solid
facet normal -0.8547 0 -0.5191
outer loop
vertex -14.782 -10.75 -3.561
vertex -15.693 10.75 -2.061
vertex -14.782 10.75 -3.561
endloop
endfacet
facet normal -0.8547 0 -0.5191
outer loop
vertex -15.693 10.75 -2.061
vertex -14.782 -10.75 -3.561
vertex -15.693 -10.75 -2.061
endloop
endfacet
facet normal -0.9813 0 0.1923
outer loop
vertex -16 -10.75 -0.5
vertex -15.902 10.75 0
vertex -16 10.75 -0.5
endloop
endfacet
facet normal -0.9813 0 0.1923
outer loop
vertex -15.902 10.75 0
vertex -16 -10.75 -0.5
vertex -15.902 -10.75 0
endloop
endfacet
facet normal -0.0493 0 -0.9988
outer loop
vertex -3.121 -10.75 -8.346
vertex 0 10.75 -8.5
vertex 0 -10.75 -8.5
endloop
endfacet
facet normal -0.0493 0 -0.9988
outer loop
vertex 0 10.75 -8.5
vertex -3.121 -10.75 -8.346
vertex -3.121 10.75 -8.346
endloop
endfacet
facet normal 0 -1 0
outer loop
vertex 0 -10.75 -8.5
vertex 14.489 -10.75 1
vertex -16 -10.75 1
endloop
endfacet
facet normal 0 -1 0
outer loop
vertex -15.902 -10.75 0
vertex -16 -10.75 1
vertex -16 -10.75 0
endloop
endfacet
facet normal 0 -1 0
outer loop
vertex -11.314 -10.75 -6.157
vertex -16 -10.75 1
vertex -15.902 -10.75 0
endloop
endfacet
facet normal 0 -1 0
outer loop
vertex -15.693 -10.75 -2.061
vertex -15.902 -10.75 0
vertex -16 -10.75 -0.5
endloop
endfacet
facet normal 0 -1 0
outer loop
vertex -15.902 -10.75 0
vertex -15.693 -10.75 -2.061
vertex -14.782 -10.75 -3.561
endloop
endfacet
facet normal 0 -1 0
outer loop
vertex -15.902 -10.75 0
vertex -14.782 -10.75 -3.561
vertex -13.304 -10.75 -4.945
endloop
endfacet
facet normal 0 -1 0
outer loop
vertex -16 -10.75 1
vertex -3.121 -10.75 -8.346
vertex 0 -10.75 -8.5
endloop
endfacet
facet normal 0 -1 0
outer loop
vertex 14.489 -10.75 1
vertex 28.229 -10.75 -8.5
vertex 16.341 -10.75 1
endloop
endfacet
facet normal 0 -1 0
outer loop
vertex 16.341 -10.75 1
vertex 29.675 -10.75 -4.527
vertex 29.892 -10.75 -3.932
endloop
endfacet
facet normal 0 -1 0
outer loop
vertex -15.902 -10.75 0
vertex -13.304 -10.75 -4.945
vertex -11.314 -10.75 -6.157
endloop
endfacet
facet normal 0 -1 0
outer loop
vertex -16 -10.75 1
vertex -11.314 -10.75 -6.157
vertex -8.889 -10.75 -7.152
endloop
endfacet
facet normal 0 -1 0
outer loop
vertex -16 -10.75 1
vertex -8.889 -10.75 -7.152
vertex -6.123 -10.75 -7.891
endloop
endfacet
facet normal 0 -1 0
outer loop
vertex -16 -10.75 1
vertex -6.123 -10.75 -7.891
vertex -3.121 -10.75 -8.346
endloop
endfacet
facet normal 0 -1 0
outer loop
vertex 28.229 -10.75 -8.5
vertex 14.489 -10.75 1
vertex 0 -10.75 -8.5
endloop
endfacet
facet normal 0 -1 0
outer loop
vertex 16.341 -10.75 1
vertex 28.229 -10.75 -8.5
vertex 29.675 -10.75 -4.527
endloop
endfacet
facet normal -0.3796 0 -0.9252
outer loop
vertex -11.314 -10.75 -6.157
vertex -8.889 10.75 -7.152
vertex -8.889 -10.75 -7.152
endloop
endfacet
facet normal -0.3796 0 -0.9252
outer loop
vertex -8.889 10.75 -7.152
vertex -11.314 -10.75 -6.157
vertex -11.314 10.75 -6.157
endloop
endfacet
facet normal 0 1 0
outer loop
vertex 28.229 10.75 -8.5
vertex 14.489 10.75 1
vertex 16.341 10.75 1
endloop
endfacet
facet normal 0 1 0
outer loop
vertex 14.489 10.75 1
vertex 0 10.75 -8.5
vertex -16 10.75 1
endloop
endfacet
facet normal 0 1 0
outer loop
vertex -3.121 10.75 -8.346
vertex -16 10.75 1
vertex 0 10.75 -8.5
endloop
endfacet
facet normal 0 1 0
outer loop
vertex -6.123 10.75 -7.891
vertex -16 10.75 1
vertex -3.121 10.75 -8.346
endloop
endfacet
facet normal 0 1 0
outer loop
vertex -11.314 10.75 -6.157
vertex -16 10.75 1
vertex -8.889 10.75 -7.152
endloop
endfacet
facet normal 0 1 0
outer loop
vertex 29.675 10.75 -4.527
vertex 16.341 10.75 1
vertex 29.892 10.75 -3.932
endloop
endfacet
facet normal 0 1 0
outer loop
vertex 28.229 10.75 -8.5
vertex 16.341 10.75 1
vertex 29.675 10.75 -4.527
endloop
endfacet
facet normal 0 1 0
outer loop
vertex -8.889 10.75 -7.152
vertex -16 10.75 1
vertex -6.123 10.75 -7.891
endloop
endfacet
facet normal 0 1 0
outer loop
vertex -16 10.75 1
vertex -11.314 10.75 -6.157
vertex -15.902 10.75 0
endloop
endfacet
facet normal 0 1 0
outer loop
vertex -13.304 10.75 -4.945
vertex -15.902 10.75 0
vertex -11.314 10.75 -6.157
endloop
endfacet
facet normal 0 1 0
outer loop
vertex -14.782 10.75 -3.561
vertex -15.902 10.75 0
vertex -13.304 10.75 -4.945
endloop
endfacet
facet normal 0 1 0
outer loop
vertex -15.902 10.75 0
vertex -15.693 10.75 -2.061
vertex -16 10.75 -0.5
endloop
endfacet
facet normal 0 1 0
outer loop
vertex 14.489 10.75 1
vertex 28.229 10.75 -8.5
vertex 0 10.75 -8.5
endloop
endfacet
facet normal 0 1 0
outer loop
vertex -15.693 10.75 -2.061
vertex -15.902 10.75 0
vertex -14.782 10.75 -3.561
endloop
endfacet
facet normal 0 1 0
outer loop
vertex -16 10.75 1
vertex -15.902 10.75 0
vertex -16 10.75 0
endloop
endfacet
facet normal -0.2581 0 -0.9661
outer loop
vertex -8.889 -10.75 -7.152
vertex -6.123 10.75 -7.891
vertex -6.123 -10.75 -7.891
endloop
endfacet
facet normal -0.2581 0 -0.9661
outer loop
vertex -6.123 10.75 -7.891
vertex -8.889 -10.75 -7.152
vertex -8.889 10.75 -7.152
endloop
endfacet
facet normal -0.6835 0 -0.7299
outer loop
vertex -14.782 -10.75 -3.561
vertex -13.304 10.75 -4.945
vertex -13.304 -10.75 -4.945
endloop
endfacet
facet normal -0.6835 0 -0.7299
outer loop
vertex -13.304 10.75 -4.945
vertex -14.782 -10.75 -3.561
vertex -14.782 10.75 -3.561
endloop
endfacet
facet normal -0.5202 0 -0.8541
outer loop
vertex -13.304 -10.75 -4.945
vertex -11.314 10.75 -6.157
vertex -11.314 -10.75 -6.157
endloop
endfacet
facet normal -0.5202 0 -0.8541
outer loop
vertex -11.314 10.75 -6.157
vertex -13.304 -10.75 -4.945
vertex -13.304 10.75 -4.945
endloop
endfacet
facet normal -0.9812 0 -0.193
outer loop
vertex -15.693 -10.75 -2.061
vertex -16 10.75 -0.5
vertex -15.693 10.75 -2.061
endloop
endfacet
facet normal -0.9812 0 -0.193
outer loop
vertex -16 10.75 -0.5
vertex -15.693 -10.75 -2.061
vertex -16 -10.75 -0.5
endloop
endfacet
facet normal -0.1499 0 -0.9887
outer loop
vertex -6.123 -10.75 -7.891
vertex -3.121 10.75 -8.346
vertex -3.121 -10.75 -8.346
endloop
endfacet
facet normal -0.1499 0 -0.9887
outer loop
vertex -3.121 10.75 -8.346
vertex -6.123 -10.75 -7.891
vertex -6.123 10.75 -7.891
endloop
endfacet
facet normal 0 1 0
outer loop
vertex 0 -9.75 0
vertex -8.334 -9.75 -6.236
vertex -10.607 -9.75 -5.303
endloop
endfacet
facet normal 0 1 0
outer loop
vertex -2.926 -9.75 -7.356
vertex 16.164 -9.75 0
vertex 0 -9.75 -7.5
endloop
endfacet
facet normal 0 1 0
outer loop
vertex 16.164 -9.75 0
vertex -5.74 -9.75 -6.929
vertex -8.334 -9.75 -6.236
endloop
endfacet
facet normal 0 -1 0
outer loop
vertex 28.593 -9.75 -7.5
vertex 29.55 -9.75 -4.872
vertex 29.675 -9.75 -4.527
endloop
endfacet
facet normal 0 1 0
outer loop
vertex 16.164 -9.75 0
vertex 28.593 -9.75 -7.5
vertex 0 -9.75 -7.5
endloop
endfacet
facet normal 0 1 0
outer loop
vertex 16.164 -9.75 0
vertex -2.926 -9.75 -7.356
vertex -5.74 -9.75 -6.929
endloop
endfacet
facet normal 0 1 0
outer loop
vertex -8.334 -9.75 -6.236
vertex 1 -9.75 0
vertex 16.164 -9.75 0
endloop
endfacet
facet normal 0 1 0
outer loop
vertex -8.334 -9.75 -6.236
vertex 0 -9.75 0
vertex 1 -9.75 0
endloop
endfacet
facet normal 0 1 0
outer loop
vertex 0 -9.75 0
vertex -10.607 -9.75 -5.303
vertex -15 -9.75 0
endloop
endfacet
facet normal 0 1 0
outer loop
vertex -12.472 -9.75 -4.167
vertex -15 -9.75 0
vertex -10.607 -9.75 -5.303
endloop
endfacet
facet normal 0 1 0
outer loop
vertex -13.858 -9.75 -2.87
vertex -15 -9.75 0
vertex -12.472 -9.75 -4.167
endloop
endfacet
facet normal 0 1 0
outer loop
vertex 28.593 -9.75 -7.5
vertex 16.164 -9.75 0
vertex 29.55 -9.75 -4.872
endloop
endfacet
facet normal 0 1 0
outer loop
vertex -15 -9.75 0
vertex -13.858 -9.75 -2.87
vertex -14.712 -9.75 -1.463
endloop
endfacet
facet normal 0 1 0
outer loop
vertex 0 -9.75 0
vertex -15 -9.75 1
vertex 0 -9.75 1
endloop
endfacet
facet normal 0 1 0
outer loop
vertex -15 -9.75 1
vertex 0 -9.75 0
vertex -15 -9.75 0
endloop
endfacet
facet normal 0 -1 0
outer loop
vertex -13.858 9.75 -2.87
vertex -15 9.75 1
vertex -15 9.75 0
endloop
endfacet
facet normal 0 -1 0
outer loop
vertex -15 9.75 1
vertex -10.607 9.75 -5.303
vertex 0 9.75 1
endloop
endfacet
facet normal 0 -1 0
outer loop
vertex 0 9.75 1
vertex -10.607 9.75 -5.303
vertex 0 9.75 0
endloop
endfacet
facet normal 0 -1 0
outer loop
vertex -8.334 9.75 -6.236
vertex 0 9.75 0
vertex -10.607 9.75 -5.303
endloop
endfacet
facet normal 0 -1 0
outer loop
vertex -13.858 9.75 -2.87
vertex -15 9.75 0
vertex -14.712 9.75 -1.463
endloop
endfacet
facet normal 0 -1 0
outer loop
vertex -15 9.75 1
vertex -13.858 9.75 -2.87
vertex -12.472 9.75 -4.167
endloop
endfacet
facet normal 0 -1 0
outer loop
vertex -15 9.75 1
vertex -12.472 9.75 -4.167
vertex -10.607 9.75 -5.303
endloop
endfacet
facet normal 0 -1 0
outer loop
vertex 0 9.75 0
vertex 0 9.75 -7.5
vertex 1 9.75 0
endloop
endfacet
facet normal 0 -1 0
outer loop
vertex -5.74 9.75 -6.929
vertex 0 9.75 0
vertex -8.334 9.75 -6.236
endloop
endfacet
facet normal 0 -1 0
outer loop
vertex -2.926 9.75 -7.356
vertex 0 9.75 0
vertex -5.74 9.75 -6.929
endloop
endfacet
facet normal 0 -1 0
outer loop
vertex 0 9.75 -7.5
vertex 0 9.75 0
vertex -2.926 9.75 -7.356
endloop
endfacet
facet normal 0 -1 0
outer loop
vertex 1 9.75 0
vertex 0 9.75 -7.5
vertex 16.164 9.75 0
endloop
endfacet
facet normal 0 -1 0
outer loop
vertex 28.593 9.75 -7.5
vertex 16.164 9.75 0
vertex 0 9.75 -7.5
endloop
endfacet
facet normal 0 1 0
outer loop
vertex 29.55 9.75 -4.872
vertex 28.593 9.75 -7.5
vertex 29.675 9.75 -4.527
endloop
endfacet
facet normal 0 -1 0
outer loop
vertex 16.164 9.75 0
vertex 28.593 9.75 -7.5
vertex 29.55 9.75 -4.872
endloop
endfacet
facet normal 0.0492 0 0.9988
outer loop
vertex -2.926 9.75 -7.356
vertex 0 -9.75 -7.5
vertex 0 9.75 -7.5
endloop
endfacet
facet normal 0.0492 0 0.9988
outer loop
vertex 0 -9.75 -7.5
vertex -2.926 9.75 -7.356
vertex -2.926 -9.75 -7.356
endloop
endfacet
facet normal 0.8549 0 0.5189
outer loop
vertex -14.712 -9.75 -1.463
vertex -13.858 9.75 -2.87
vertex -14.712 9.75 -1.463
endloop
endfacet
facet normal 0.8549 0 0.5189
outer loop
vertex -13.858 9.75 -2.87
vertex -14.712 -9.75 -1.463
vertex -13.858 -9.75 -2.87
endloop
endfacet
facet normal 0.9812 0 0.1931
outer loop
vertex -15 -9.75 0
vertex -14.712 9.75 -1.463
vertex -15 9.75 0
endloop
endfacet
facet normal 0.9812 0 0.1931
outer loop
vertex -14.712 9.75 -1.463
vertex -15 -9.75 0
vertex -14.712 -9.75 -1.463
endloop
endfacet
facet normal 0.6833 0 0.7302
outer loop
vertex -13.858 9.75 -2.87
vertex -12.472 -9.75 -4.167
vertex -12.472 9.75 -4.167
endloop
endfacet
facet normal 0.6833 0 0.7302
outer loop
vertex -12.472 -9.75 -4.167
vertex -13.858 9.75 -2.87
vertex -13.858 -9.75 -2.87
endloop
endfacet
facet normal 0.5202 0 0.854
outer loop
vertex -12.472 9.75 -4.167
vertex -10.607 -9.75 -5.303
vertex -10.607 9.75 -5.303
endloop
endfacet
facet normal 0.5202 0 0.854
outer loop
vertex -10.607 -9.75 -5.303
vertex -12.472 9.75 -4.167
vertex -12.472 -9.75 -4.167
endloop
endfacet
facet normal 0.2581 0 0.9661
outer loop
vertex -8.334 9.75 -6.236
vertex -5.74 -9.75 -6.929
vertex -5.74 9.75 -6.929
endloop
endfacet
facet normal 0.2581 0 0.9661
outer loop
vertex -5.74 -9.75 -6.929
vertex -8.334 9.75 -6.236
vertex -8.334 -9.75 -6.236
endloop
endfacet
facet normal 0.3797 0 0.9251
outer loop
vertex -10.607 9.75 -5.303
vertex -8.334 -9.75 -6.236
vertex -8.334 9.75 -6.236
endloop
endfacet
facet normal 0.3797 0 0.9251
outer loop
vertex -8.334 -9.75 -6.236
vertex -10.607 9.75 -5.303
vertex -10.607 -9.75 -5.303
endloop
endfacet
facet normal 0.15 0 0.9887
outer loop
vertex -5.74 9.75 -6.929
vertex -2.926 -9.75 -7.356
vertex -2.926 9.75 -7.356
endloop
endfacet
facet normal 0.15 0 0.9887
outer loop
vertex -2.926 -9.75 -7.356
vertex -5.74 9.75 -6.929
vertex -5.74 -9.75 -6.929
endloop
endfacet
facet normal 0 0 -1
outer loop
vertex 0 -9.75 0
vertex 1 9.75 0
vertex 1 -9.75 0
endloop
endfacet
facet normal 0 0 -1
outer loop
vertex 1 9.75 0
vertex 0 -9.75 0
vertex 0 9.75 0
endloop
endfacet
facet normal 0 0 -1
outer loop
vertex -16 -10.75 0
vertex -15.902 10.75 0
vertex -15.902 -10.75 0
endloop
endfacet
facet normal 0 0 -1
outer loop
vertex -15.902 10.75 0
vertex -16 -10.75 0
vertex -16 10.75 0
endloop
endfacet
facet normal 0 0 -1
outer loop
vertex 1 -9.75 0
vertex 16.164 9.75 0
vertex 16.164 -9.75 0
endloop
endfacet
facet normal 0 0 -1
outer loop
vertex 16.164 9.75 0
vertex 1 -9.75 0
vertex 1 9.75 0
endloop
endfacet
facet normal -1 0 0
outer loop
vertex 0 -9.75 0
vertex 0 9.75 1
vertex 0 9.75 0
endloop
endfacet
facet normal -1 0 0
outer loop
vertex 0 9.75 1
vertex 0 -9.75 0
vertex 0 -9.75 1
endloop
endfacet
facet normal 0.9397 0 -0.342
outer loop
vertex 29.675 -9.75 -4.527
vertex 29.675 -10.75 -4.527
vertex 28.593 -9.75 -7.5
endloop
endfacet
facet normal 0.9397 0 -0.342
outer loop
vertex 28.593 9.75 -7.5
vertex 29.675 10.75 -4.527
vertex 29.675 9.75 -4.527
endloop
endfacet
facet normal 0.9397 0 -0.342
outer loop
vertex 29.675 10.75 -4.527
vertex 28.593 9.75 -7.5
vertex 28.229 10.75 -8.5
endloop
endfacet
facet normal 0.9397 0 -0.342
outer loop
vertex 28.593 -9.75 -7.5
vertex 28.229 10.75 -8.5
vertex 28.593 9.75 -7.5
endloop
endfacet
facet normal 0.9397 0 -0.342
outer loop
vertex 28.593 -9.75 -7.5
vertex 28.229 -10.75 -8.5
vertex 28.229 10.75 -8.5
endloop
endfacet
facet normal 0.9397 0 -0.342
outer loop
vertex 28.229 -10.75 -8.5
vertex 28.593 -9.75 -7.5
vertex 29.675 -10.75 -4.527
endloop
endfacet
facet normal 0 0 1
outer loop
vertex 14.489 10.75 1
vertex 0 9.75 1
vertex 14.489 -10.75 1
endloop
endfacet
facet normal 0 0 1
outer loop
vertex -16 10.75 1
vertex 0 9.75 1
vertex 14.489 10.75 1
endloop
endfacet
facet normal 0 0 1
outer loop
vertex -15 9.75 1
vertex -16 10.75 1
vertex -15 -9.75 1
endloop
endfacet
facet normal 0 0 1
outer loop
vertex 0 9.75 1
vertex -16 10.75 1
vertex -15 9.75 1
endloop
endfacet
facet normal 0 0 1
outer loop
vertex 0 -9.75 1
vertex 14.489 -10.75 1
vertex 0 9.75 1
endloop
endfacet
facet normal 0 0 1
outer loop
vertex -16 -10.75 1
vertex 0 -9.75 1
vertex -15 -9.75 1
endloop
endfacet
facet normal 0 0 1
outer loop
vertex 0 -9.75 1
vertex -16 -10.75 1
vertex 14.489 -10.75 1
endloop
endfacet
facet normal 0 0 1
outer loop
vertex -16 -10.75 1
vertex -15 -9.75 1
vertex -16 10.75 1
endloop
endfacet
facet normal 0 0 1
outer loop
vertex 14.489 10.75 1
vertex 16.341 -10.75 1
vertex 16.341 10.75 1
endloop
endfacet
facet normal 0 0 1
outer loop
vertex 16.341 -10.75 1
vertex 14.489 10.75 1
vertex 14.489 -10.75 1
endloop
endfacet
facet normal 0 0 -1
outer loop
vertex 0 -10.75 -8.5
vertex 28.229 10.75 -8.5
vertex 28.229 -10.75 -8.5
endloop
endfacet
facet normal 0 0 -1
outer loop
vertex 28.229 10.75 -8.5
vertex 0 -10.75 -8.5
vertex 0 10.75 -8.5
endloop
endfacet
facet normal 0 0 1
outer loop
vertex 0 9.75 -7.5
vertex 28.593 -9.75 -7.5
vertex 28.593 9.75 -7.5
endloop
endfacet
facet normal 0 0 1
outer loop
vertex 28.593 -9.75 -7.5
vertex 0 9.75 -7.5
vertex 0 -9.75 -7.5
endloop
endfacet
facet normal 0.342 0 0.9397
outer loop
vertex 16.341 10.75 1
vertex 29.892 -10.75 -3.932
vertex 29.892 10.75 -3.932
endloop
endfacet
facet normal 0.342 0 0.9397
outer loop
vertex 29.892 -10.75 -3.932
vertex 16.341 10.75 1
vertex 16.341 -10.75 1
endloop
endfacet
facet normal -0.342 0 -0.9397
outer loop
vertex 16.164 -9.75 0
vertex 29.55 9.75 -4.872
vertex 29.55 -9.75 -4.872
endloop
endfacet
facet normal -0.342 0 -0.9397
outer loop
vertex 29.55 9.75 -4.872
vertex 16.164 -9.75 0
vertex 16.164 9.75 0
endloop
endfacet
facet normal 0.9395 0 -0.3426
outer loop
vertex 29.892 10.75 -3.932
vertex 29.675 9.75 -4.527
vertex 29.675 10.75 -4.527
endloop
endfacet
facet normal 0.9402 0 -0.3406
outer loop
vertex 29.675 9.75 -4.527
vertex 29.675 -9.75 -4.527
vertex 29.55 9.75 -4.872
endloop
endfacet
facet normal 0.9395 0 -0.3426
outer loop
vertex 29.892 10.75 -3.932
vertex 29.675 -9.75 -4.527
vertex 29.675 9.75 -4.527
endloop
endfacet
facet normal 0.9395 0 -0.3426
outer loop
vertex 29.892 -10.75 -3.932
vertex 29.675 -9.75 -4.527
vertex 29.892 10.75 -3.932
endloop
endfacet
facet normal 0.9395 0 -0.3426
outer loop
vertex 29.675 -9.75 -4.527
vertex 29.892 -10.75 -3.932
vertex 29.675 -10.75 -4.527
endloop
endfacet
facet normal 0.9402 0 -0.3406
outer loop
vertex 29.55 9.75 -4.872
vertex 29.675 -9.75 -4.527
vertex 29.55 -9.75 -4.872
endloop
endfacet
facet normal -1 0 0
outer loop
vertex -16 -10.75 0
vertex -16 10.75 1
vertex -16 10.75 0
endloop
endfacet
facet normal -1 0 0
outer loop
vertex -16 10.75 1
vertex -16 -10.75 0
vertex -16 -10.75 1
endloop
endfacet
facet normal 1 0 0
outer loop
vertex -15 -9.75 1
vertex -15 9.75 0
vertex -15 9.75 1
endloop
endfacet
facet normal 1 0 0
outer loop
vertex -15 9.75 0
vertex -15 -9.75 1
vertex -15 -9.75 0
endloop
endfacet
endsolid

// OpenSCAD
$fn=32;

difference() {
  scale([1,1,0.5]) translate([0,0,-1]) rotate([90,0,0]) cylinder(r=15+1, h=19.5+2, center=true);
  scale([1,1,0.5]) rotate([90,0,0]) cylinder(r=15, h=19.5, center=true);
  translate([0,0,50/2]) cube([50,50,50], center=true);
  translate([50/2,0,0]) cube([50,50,50], center=true);
}
difference() {
  translate([30/2,0,-15/2/2]) cube([30,19.5+2,15/2+2], center=true);
  translate([30/2,0,-15/2/2]) cube([30,19.5,15/2], center=true);
  
  translate([19,0,10]) rotate([0,20,0]) union() {
    cube([30,19.5+2,20], center=true);
    translate([30/2+5/2,0,-10]) cube([5,19.5+2,20], center=true);
  }
}
difference() {
  translate([19,0,-1/2]) rotate([0,20,0]) cube([23,19.5+2,1], center=true);
  translate([19,0,10]) rotate([0,20,0]) translate([30/2+5/2,0,-10]) cube([5,19.5+2,20], center=true);
  translate([0,0,50/2+1]) cube([50,50,50], center=true);
}
difference() {
  translate([-15/2,0,1/2]) cube([15+2,19.5+2,1], center=true);
  translate([-15/2,0,1/2]) cube([15,19.5,1], center=true);
}
